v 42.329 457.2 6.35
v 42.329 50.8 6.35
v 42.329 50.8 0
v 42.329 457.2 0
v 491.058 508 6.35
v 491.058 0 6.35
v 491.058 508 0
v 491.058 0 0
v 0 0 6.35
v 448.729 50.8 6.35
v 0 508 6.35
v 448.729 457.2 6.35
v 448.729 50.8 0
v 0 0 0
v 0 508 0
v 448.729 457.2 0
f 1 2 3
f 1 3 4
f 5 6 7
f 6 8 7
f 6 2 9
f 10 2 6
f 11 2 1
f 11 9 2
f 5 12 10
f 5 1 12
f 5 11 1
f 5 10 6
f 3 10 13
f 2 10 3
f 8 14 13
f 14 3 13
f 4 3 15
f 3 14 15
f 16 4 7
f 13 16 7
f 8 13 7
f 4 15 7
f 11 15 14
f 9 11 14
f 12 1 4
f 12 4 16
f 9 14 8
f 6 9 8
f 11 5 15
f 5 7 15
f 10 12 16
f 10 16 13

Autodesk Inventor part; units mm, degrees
ref_plane "YZ Plane" through (0, 0, 0) normal (1, 0, 0) x (0, 1, 0)
ref_plane "XZ Plane" through (0, 0, 0) normal (0, 1, 0) x (-1, 0, 0)
ref_plane "XY Plane" through (0, 0, 0) normal (0, 0, 1) x (1, 0, 0)
sketch "Sketch1" plane through (0, 0, 0) normal (0, 0, 1) x (1, 0, 0)
  line L0 (0, 0) -> (491.0582, 0)
  line L1 (491.0582, 0) -> (491.0582, 508)
  line L2 (491.0582, 508) -> (0, 508)
  line L3 (0, 508) -> (0, 0)
  dimension "d0" = 491.0582
  dimension "d1" = 508
extrude "Extrusion1" add sketch "Sketch1" along normal blind 6.35
sketch "Sketch2" plane through (0, 0, 6.35) normal (0, 0, 1) x (1, 0, 0)
  line L0 (42.3291, 457.2) -> (448.7291, 457.2)
  line L1 (448.7291, 457.2) -> (448.7291, 50.8)
  line L2 (448.7291, 50.8) -> (42.3291, 50.8)
  line L3 (42.3291, 50.8) -> (42.3291, 457.2)
  line L4 (245.5291, 50.8) -> (245.5291, 0)
  line L5 (0, 0) -> (491.0582, 0) projected
  line L6 (245.5291, 457.2) -> (245.5291, 508)
  line L7 (491.0582, 508) -> (0, 508) projected
  line L8 (42.3291, 254) -> (0, 254)
  line L9 (0, 508) -> (0, 0) projected
  line L10 (448.7291, 254) -> (491.0582, 254)
  line L11 (491.0582, 0) -> (491.0582, 508) projected
  dimension "d4" = 406.4
  dimension "d5" = 406.4
extrude "Extrusion2" cut sketch "Sketch2" against normal blind 6.35 contours L0 L1 L2 L3
properties part number "window inner"
